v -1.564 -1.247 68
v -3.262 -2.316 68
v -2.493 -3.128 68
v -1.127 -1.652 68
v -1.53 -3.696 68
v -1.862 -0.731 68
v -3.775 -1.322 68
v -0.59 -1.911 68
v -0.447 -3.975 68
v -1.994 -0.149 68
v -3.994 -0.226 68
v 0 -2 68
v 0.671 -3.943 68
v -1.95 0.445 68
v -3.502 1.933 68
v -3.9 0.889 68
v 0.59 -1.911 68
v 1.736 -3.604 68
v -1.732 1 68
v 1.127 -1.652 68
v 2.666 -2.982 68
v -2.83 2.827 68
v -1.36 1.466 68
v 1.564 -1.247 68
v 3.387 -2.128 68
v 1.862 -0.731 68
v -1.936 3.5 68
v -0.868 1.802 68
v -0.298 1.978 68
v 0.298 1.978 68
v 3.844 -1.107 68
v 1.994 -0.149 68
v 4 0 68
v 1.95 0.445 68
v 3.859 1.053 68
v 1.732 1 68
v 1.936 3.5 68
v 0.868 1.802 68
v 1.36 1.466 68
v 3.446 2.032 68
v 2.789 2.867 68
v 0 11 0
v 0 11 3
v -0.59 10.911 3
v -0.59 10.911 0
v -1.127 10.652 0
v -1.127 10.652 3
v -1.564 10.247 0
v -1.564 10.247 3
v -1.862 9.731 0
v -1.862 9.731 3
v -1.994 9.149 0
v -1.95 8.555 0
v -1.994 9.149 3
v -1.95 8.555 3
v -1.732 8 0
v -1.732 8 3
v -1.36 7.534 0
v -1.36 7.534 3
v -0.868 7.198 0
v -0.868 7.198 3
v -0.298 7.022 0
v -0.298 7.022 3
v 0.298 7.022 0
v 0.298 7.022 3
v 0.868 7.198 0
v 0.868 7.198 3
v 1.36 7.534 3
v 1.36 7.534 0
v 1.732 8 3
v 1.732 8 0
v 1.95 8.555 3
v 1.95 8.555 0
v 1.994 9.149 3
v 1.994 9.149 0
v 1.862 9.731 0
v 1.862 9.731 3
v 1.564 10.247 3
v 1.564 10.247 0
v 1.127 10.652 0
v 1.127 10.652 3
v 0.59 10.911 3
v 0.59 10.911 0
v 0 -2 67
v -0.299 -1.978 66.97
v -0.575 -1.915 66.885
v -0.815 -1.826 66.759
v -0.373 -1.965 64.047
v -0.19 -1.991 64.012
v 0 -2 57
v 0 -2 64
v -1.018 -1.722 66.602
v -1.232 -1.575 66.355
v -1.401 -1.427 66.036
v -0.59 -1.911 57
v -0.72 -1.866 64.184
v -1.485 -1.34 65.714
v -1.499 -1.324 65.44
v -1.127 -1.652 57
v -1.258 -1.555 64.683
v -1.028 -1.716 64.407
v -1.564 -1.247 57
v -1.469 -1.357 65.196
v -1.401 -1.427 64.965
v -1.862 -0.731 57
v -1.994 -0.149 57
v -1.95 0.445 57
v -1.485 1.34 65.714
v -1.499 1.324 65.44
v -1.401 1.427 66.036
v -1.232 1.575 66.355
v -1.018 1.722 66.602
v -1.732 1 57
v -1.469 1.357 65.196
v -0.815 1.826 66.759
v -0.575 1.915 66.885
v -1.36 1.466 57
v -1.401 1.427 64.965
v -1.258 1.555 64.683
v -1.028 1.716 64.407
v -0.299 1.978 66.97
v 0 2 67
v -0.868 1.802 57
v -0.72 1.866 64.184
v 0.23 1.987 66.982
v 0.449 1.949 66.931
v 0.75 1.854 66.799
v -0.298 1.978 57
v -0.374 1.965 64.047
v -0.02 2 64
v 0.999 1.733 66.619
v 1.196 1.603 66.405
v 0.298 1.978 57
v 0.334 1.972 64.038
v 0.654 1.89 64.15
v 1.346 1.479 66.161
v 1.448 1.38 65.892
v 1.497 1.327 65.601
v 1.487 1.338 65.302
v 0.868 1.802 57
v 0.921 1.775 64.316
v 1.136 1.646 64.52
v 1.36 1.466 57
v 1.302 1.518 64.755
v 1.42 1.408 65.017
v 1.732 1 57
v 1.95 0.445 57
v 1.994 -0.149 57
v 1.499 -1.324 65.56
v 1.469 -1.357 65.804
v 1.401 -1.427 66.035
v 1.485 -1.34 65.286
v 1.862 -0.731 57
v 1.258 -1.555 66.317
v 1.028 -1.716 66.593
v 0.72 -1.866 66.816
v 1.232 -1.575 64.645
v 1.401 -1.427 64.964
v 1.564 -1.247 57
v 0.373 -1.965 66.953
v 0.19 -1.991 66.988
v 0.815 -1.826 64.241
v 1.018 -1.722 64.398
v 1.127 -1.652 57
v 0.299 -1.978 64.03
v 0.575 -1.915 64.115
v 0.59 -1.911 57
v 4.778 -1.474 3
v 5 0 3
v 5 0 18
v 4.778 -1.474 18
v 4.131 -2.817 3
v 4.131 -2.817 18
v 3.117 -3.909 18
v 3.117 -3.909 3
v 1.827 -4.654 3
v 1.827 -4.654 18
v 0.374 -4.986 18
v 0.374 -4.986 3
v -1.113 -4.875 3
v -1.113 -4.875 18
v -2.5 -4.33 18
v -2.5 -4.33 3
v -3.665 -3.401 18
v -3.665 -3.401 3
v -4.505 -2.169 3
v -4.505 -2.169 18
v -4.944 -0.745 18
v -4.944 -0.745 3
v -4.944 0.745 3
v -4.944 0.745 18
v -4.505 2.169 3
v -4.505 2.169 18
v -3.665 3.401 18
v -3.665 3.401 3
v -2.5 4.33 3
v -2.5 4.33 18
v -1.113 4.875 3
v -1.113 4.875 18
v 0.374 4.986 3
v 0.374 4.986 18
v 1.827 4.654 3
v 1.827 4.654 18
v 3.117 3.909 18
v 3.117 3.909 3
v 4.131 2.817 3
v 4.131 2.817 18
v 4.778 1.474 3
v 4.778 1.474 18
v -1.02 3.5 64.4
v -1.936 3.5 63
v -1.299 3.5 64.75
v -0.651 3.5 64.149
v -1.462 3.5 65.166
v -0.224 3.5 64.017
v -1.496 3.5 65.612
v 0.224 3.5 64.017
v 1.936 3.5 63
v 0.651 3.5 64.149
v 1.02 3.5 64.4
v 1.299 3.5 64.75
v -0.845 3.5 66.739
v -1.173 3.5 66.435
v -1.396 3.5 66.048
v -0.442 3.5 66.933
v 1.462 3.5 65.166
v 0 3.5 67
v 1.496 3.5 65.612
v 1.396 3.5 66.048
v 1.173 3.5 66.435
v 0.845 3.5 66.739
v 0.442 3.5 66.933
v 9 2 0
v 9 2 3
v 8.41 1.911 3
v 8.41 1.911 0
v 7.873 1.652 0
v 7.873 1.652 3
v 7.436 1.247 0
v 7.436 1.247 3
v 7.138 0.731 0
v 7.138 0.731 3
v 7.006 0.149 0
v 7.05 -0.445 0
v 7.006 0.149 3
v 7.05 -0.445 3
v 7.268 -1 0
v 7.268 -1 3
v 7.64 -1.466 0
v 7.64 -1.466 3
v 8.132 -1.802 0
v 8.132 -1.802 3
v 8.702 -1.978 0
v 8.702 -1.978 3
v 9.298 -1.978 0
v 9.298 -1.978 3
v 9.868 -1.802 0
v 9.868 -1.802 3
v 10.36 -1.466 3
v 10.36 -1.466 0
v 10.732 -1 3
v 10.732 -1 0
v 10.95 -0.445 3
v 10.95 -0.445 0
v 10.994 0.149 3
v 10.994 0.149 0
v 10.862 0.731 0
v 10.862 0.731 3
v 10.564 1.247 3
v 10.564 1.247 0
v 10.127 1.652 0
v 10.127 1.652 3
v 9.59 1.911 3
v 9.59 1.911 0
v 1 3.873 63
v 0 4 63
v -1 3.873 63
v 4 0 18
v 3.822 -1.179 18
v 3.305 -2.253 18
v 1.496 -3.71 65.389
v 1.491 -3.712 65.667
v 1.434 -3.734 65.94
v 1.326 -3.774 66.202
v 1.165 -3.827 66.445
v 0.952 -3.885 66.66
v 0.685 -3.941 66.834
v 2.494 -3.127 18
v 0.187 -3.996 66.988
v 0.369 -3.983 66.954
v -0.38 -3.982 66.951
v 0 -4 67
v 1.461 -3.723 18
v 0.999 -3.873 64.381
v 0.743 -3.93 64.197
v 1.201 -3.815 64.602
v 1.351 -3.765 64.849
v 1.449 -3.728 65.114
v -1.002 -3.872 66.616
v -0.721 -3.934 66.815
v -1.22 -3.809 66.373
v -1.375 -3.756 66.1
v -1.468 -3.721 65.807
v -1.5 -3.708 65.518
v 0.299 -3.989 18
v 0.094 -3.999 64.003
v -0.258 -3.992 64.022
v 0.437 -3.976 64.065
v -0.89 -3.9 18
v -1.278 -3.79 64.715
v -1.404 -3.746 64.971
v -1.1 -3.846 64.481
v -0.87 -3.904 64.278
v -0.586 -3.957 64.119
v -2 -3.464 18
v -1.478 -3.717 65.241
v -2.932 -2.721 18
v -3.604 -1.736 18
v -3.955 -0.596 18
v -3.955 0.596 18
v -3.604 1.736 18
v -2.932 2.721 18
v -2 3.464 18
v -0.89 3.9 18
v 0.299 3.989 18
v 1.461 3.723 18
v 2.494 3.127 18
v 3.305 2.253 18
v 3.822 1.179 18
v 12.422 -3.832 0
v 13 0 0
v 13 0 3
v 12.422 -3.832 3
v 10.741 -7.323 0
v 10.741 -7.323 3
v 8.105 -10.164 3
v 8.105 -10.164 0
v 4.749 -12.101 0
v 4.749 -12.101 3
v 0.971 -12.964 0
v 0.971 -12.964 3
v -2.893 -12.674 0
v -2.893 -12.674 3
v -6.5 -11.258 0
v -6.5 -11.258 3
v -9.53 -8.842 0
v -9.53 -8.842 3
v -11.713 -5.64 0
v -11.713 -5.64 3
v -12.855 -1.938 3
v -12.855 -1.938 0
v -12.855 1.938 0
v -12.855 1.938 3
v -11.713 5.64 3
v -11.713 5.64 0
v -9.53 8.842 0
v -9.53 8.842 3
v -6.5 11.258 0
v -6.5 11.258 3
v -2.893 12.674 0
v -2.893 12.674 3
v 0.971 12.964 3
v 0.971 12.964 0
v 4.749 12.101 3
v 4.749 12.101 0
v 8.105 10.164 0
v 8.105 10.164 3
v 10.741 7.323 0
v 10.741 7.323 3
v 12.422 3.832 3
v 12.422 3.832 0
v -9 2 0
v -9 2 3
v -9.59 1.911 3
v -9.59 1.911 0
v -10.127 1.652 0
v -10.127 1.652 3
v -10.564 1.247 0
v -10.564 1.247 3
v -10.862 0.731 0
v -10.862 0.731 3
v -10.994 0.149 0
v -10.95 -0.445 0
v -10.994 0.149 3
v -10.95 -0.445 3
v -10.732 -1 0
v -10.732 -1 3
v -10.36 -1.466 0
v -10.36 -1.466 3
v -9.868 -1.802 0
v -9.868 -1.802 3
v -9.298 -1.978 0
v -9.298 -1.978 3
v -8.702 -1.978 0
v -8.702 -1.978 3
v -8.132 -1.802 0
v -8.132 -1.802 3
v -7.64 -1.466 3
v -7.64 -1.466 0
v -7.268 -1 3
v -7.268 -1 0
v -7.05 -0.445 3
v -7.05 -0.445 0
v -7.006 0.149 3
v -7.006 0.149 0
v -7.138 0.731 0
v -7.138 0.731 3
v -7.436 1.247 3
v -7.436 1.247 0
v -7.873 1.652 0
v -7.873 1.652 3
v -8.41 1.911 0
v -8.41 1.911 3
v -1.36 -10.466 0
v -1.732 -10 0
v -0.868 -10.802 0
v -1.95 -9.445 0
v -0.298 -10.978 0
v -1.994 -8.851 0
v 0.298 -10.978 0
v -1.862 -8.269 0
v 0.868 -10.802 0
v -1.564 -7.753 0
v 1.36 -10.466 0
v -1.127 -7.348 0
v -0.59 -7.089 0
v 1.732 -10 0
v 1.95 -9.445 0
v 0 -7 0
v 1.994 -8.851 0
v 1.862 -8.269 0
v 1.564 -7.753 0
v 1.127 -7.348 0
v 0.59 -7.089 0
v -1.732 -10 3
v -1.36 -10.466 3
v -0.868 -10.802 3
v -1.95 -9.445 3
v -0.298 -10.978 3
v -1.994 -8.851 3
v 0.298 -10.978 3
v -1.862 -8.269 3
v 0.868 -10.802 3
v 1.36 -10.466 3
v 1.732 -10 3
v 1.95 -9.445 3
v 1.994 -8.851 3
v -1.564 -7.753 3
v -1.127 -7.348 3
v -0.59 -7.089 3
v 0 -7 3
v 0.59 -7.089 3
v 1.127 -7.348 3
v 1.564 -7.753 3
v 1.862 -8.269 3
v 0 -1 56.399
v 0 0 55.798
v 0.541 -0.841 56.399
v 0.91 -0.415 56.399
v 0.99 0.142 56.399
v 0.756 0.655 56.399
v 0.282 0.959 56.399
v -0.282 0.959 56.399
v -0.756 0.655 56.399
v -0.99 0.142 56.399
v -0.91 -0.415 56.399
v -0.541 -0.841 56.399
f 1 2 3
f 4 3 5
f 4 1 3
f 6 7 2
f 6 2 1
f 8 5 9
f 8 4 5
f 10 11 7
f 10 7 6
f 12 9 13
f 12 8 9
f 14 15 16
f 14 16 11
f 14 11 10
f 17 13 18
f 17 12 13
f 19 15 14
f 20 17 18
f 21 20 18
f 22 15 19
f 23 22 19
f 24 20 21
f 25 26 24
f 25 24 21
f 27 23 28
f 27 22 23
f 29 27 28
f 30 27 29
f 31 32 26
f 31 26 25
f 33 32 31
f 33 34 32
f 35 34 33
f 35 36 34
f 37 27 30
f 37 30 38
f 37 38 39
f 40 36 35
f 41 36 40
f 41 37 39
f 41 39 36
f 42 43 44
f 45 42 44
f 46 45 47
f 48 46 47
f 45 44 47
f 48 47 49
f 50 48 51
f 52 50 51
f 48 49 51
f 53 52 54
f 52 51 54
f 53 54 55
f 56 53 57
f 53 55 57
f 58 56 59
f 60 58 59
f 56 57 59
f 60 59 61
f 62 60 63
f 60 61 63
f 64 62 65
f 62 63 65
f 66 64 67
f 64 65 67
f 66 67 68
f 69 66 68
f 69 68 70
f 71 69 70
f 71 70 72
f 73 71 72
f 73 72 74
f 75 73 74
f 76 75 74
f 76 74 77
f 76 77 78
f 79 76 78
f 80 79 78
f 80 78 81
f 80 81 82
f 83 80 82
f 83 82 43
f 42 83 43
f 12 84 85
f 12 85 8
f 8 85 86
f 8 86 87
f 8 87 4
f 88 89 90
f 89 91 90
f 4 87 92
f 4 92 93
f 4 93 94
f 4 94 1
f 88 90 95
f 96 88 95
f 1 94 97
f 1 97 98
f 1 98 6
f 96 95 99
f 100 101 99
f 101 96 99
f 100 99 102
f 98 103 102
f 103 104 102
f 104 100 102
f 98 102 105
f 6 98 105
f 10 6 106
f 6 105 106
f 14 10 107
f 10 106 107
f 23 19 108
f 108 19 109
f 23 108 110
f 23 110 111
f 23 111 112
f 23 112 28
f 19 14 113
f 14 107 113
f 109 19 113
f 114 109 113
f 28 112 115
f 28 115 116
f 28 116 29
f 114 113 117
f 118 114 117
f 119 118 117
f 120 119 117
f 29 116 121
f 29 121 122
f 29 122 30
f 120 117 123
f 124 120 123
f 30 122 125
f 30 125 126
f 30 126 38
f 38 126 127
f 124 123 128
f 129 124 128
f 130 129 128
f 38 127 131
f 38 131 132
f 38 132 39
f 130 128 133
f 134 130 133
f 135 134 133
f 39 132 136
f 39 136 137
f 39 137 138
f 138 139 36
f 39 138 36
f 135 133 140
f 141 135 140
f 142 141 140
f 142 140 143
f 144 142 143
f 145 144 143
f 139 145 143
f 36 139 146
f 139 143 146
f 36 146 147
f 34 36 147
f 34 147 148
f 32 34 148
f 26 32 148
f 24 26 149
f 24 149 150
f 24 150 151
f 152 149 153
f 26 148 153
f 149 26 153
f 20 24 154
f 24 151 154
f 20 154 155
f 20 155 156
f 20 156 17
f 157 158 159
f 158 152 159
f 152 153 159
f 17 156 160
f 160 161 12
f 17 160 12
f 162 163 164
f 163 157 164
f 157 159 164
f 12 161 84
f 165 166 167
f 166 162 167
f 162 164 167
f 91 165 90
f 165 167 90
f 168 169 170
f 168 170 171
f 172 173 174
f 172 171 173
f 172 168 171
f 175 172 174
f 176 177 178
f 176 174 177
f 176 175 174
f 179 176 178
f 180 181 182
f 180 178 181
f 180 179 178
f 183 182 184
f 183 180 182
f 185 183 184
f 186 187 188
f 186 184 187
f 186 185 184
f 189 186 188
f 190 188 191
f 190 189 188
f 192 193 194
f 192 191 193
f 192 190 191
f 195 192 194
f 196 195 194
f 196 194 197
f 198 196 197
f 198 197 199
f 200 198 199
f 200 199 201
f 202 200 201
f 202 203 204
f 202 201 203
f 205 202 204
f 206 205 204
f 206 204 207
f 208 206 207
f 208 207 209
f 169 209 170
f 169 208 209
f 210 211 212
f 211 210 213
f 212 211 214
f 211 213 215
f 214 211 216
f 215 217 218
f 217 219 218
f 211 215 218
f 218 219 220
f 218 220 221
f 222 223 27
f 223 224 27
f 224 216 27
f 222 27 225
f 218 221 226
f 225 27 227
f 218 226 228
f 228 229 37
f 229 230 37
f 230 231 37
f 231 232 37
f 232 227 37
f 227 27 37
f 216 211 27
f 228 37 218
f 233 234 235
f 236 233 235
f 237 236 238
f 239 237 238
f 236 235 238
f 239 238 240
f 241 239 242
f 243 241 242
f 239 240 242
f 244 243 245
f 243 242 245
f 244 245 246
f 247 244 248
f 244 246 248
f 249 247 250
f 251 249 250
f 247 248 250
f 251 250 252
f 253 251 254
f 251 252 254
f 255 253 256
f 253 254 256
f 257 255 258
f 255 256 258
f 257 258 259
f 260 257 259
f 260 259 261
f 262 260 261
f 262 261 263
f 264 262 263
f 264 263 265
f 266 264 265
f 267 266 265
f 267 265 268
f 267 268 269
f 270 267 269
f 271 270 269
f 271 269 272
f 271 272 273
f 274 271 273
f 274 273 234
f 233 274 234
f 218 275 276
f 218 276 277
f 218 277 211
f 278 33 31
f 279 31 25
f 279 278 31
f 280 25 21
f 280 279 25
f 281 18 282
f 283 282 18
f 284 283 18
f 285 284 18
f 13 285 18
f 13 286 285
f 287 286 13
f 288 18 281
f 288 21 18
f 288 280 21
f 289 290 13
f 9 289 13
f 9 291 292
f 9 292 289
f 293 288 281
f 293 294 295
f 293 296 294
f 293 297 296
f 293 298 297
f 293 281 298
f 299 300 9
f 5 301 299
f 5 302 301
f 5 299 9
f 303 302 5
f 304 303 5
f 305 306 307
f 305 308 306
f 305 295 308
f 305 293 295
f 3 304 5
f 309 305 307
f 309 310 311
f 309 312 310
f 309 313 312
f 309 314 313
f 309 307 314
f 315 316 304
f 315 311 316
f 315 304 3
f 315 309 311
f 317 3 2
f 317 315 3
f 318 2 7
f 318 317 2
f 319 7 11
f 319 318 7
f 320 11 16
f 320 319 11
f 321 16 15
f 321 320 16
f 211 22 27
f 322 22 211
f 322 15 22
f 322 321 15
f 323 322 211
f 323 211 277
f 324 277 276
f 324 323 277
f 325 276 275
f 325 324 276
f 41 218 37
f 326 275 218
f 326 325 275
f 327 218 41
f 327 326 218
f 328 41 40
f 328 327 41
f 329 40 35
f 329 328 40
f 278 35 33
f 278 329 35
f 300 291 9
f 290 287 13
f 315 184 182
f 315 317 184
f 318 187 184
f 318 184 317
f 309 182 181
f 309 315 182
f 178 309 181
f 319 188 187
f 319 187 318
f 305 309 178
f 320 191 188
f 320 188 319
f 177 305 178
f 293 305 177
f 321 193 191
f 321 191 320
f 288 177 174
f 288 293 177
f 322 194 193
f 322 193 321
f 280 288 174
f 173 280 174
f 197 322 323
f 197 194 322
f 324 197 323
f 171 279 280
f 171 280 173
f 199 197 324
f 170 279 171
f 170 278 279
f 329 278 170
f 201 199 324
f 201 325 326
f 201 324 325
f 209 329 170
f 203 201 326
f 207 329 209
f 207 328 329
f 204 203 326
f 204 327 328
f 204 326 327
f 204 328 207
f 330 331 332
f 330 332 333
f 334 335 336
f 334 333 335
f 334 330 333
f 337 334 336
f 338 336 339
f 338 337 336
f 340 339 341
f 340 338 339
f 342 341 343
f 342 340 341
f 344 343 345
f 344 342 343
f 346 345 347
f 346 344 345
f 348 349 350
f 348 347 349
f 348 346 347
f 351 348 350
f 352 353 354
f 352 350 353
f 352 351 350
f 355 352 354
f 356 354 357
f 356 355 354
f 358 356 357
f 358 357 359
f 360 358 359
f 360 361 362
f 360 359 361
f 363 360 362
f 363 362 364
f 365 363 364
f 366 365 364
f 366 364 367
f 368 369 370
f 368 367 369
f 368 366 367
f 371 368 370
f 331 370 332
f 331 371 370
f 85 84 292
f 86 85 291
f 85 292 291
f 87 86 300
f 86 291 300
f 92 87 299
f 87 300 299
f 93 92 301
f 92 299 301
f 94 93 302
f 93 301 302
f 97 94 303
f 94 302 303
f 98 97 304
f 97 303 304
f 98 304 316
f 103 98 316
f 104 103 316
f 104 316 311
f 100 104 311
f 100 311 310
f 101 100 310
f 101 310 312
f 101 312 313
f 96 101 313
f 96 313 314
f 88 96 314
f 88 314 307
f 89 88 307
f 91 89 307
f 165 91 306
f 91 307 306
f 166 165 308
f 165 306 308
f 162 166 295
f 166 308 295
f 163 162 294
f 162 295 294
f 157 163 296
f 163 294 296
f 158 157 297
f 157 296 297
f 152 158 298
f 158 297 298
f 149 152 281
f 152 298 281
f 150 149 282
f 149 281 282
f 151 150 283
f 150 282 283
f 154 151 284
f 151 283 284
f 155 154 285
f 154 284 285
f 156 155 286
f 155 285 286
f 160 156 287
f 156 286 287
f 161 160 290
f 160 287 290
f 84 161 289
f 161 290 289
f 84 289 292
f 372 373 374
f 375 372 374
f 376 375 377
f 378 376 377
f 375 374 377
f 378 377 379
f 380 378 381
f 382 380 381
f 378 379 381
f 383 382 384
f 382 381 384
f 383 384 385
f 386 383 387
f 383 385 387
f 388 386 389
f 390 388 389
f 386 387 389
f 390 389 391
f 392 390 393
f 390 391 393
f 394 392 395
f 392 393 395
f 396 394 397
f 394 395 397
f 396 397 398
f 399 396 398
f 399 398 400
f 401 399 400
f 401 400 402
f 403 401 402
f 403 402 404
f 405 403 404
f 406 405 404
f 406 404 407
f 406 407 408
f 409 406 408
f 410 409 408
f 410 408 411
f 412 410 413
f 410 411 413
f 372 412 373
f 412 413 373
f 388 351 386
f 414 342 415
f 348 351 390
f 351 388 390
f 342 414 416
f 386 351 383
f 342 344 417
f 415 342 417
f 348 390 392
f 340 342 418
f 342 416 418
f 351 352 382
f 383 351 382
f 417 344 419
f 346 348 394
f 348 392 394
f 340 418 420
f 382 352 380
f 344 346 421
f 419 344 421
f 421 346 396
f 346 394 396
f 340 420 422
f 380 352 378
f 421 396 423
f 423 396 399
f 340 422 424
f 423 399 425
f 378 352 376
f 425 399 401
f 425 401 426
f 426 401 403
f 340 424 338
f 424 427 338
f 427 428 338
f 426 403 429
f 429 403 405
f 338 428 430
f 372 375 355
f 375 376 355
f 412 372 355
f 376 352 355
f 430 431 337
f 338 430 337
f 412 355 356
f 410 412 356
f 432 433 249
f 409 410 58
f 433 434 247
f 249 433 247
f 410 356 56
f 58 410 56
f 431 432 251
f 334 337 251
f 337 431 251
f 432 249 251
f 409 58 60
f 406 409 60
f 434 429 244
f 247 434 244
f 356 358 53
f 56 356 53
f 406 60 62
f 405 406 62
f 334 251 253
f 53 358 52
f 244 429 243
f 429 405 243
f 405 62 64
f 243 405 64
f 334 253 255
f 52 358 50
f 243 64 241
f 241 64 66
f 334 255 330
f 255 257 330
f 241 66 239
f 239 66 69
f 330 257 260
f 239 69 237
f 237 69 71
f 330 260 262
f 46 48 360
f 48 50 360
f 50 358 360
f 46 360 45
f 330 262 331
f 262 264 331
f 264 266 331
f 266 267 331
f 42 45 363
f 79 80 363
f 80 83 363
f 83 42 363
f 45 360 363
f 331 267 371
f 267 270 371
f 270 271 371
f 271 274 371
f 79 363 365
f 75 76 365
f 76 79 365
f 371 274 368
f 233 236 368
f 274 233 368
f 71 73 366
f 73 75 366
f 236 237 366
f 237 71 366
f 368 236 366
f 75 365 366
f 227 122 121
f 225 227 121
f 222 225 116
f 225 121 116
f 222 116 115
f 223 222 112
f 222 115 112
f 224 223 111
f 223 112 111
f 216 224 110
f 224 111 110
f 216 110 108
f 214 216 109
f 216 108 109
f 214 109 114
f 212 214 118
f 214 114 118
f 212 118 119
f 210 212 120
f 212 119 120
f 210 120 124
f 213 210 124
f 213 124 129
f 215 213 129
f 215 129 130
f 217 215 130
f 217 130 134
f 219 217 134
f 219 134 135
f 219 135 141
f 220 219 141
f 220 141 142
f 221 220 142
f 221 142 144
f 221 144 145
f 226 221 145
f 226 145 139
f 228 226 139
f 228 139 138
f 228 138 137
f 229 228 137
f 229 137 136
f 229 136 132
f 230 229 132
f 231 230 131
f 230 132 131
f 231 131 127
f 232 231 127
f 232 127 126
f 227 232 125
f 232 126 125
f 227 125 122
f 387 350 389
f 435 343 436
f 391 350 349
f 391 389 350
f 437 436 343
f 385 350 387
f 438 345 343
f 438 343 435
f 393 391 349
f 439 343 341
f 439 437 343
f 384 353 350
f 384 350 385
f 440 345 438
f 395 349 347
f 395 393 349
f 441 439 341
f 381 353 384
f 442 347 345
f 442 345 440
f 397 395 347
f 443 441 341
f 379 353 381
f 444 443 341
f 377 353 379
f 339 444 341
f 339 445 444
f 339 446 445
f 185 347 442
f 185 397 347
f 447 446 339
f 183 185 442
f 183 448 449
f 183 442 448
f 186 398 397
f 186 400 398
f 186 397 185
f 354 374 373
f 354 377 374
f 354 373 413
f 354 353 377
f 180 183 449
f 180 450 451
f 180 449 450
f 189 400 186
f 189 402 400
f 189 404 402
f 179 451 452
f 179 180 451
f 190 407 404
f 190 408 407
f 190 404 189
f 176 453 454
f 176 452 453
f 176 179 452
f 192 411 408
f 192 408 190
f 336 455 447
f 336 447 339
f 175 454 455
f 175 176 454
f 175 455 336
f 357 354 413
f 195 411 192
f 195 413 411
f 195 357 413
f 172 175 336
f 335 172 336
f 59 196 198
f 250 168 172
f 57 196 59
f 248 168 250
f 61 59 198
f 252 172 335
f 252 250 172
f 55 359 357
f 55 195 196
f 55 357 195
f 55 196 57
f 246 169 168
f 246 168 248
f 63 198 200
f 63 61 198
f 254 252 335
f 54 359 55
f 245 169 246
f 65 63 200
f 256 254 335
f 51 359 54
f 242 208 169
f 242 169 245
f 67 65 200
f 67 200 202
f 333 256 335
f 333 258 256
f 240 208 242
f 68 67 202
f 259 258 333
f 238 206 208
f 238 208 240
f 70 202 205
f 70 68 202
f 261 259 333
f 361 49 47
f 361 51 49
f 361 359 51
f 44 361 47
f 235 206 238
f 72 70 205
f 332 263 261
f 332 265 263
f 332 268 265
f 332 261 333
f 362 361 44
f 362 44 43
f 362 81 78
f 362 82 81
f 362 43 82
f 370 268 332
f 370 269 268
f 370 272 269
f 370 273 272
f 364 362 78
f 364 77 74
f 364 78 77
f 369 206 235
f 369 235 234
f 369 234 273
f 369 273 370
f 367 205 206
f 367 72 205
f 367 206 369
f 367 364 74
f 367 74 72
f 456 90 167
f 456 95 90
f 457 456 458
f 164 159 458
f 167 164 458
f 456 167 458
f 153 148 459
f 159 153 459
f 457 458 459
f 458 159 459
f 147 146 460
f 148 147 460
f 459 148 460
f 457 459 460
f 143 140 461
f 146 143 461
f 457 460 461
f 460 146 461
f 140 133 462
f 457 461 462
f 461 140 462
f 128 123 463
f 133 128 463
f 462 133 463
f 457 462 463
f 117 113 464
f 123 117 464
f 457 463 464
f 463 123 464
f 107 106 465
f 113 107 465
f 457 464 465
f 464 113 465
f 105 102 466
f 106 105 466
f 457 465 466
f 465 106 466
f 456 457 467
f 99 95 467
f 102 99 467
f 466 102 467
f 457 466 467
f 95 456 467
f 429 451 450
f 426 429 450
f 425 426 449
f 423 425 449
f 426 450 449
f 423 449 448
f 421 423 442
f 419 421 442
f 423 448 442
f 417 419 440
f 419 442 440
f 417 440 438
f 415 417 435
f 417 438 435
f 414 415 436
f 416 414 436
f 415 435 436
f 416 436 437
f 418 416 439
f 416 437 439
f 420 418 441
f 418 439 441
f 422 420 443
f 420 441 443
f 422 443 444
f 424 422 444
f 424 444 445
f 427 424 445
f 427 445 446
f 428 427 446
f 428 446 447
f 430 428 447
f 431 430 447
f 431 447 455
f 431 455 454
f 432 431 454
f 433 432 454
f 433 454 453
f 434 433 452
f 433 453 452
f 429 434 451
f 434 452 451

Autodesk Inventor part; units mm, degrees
ref_plane "YZ Plane" through (0, 0, 0) normal (1, 0, 0) x (0, 1, 0)
ref_plane "XZ Plane" through (0, 0, 0) normal (0, 1, 0) x (-1, 0, 0)
ref_plane "XY Plane" through (0, 0, 0) normal (0, 0, 1) x (1, 0, 0)
sketch "Szkic1" plane through (0, 0, 0) normal (0, 0, 1) x (1, 0, 0)
  circle A0 centre (0, 0) radius 13
  dimension "d0" = 26
extrude "Wyciągnięcie proste1" add sketch "Szkic1" along normal blind 3
sketch "Szkic2" plane through (0, 0, 3) normal (0, 0, 1) x (1, 0, 0)
  circle A0 centre (0, 0) radius 5
  dimension "d3" = 10
extrude "Wyciągnięcie proste2" add sketch "Szkic2" along normal blind 15
sketch "Szkic3" plane through (0, 0, 18) normal (0, 0, 1) x (1, 0, 0)
  circle A0 centre (0, 0) radius 4
  dimension "d6" = 8
extrude "Wyciągnięcie proste3" add sketch "Szkic3" along normal blind 50
thread "Gwint1" size "M8x1.25" class "6g" standard "ANSI Metric M Profile" length 20
sketch "Szkic4" plane through (0, 0, 68) normal (0, 0, 1) x (1, 0, 0)
  circle A0 centre (0, 0) radius 2
  dimension "d11" = 4
sketch "Szkic9" plane through (0, 0, 68) normal (0, 0, 1) x (1, 0, 0)
  circle A0 centre (0, 0) radius 4 projected
  line L0 (-1.9365, 3.5) -> (1.9365, 3.5)
  dimension "d34" = 3.5
extrude "Wyciągnięcie proste7" cut sketch "Szkic9" against normal blind 5 contours L0 A0 picked at (-0.3981, 3.6058)
sketch "Szkic10" plane through (-1.9365, 3.5, 68) normal (0, 1, 0) x (1, 0, 0)
  line L0 (3.873, 0) -> (0, 0) projected
  line L1 (3.873, 5) -> (3.873, 0) projected
  line L2 (3.873, 5) -> (0, 5) projected
  line L3 (0, 0) -> (0, 5) projected
  line L4 (3.873, 5) -> (3.873, 0) construction
  line L5 (3.873, 2.5) -> (0, 2.5) construction
  line L6 (0, 0) -> (0, 5) construction
  point P0 (1.9365, 68)
  point P1 (1.9365, 2.5)
hole "Otwór2" at (0, 3.5, 65.5) direction (0, -1, 0) diameter 3 depth 20 tip angle 118
hole "Otwór3" at (0, 0, 68) direction (0, 0, -1) diameter 4 depth 11 tip angle 118
sketch "Szkic11" plane through (0, 0, 0) normal (0, 0, -1) x (-1, 0, 0)
  circle A0 centre (0, 0) radius 9 construction
  line L0 (9, 0) -> (-9, 0) construction
  line L1 (0, -9) -> (0, 9) construction
  dimension "d55" = 18
hole "Otwór4" at (9, 0, 0) at (-9, 0, 0) at (0, -9, 0) at (0, 9, 0) direction (0, 0, 1) diameter 4 depth 8 tip angle 118
thread "Gwint3" size "M3x0.5" class "6H" standard "ANSI Metric M Profile" full length
thread "Gwint4" size "M3x0.5" class "6H" standard "ANSI Metric M Profile" full length
properties part number "shaft"
